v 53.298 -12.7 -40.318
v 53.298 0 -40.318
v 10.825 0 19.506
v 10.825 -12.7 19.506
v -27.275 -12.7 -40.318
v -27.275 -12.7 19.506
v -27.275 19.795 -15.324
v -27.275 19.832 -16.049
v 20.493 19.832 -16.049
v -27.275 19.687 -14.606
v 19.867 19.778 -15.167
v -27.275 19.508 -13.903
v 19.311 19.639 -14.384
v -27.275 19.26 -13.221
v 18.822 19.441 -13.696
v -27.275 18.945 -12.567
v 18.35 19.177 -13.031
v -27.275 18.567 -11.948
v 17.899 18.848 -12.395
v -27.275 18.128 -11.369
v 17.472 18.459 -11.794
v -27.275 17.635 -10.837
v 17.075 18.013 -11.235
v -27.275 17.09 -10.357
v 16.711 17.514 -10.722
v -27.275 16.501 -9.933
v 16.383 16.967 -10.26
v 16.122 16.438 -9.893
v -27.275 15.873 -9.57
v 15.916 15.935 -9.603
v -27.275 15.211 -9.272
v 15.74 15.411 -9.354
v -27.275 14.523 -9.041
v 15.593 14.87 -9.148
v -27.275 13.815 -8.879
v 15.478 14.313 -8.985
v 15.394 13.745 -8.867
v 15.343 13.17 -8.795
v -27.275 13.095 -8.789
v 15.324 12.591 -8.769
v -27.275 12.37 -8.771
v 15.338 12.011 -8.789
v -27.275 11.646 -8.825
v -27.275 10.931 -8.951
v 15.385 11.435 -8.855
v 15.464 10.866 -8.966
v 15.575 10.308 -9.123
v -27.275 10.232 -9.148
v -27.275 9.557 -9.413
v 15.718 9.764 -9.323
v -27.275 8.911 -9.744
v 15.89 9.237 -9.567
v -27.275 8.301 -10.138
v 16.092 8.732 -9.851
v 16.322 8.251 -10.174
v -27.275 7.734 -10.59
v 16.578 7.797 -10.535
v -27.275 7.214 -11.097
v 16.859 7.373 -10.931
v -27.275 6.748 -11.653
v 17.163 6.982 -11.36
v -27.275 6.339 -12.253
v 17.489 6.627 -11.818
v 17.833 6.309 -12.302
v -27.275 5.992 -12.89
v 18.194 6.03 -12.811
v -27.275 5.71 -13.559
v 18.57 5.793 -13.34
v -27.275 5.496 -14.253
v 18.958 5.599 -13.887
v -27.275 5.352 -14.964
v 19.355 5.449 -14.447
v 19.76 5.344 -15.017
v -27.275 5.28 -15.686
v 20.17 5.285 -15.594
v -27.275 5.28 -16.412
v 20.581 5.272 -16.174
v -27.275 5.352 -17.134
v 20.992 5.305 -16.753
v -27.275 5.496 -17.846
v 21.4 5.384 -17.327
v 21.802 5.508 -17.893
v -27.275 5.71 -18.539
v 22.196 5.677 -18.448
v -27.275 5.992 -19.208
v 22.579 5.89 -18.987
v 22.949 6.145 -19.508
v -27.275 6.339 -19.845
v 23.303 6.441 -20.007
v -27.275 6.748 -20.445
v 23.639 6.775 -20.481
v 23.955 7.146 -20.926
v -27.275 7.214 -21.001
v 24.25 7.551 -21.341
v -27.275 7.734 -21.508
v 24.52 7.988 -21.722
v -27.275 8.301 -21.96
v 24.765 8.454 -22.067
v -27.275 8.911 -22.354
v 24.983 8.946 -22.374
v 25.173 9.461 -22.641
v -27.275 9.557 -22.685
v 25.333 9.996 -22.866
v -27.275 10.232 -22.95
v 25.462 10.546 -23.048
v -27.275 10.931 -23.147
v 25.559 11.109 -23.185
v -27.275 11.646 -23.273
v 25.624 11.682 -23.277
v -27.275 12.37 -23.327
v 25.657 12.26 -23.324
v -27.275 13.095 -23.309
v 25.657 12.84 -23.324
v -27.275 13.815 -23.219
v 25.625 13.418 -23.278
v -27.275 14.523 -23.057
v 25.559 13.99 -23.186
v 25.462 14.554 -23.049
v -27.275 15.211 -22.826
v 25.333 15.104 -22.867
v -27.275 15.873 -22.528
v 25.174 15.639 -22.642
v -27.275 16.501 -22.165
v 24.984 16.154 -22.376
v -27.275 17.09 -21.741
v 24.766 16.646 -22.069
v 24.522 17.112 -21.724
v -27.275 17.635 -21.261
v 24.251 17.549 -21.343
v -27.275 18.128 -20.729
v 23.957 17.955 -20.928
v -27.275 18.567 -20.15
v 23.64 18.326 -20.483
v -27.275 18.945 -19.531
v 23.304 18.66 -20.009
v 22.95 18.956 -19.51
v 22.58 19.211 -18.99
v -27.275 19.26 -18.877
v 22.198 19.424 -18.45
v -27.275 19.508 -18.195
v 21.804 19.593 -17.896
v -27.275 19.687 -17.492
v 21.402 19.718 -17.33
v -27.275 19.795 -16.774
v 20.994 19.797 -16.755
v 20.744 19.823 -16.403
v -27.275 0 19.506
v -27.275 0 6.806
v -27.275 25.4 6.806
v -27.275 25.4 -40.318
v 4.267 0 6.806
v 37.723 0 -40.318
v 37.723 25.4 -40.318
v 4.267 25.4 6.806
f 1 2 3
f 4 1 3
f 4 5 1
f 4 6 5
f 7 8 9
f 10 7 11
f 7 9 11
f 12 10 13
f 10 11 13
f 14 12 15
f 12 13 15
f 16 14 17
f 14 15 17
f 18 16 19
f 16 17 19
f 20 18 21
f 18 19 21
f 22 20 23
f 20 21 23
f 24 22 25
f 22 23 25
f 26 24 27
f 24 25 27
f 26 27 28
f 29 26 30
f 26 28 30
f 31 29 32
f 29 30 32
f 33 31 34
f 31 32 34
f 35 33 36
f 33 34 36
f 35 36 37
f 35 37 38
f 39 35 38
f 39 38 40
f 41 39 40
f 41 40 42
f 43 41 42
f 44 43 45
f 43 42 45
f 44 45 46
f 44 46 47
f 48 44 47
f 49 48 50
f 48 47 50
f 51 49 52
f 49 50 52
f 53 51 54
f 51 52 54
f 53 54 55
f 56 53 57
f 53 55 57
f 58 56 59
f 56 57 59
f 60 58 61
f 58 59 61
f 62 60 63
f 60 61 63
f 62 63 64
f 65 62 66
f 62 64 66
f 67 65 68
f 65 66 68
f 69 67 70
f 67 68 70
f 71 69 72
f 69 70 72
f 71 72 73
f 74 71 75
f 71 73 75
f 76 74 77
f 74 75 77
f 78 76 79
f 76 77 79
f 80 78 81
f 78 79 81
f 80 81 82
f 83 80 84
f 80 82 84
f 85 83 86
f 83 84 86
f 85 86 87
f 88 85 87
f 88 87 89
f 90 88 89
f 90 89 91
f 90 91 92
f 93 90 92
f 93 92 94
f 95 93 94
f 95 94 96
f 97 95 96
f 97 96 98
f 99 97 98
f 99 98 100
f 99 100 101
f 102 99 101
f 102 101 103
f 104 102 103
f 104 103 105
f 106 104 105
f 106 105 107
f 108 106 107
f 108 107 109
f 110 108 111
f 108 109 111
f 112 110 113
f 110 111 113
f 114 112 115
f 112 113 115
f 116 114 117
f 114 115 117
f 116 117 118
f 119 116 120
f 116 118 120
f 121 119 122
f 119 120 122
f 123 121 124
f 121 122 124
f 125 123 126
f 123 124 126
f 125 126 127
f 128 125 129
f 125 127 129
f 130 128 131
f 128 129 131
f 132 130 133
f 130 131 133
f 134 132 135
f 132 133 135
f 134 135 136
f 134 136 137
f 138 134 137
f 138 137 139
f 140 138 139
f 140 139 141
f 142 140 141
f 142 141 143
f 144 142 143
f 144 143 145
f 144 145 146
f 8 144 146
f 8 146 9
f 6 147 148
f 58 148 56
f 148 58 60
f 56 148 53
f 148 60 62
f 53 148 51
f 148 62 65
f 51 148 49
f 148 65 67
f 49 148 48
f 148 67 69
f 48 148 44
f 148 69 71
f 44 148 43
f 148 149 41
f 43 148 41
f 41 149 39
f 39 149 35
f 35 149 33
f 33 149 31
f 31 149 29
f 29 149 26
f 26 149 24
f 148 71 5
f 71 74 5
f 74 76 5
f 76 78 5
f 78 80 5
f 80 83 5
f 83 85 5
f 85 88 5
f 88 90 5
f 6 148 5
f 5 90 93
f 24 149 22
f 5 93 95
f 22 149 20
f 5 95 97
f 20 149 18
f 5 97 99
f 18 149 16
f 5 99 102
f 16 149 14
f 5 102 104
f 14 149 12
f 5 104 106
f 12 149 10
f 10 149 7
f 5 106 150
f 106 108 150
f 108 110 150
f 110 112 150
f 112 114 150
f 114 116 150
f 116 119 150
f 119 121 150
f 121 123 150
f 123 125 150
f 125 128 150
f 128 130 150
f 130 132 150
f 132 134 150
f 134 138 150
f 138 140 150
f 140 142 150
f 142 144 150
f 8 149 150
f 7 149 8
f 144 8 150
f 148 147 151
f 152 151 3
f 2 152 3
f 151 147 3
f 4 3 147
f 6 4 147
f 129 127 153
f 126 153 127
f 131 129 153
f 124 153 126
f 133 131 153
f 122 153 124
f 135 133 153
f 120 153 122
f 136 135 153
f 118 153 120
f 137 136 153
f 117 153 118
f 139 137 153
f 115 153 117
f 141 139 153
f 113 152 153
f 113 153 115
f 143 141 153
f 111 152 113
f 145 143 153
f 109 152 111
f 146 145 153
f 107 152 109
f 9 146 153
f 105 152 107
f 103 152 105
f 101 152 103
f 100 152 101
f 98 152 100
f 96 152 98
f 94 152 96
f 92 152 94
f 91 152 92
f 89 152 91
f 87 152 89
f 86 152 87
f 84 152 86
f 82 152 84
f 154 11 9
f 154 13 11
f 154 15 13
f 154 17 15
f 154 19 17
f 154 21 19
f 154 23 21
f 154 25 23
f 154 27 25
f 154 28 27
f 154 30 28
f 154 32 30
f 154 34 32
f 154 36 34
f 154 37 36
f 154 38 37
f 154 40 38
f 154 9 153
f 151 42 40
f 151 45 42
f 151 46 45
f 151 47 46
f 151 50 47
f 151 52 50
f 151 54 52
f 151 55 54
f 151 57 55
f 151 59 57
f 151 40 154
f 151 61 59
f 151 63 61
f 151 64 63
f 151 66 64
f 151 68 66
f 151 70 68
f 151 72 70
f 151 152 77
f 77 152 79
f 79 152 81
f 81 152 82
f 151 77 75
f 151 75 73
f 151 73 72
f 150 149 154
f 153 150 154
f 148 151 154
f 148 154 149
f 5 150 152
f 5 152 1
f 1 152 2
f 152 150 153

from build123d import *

# Parameters (mm, degrees)
F1_DEPTH = 25.4
F2_DEPTH = 12.7
F3_R     = 7.2804284813
F4_DEPTH = 63.5


with BuildPart() as f1:
    # F0 (on Front) → F1 (new body)
    with BuildSketch(Plane.XZ):
        Polygon((-27.2746011741, 6.805870682), (-27.2746011741, -40.3181260384), (37.7226605214, -40.3181260384), (4.2666643036, 6.805870682), align=None)
    extrude(amount=-F1_DEPTH)

    # F0 (on Front) → F2 (join)
    with BuildSketch(Plane.XZ):
        Polygon((-27.2746011741, 6.805870682), (-27.2746011741, -40.3181260384), (37.7226605214, -40.3181260384), (4.2666643036, 6.805870682), align=None)
        Polygon((4.2666643036, 6.805870682), (37.7226605214, -40.3181260384), (53.2978448683, -40.3181260384), (10.8253988259, 19.505870682), (-27.2746011741, 19.505870682), (-27.2746011741, 6.805870682), align=None)
    extrude(amount=F2_DEPTH)

    # F3 (on Right) → F4 (cut, symmetric)
    with BuildSketch(Plane.YZ):
        with Locations((12.5511875376, -16.0490572453)):
            Circle(F3_R)
    extrude(amount=F4_DEPTH, both=True, mode=Mode.SUBTRACT)


solid = f1.part
